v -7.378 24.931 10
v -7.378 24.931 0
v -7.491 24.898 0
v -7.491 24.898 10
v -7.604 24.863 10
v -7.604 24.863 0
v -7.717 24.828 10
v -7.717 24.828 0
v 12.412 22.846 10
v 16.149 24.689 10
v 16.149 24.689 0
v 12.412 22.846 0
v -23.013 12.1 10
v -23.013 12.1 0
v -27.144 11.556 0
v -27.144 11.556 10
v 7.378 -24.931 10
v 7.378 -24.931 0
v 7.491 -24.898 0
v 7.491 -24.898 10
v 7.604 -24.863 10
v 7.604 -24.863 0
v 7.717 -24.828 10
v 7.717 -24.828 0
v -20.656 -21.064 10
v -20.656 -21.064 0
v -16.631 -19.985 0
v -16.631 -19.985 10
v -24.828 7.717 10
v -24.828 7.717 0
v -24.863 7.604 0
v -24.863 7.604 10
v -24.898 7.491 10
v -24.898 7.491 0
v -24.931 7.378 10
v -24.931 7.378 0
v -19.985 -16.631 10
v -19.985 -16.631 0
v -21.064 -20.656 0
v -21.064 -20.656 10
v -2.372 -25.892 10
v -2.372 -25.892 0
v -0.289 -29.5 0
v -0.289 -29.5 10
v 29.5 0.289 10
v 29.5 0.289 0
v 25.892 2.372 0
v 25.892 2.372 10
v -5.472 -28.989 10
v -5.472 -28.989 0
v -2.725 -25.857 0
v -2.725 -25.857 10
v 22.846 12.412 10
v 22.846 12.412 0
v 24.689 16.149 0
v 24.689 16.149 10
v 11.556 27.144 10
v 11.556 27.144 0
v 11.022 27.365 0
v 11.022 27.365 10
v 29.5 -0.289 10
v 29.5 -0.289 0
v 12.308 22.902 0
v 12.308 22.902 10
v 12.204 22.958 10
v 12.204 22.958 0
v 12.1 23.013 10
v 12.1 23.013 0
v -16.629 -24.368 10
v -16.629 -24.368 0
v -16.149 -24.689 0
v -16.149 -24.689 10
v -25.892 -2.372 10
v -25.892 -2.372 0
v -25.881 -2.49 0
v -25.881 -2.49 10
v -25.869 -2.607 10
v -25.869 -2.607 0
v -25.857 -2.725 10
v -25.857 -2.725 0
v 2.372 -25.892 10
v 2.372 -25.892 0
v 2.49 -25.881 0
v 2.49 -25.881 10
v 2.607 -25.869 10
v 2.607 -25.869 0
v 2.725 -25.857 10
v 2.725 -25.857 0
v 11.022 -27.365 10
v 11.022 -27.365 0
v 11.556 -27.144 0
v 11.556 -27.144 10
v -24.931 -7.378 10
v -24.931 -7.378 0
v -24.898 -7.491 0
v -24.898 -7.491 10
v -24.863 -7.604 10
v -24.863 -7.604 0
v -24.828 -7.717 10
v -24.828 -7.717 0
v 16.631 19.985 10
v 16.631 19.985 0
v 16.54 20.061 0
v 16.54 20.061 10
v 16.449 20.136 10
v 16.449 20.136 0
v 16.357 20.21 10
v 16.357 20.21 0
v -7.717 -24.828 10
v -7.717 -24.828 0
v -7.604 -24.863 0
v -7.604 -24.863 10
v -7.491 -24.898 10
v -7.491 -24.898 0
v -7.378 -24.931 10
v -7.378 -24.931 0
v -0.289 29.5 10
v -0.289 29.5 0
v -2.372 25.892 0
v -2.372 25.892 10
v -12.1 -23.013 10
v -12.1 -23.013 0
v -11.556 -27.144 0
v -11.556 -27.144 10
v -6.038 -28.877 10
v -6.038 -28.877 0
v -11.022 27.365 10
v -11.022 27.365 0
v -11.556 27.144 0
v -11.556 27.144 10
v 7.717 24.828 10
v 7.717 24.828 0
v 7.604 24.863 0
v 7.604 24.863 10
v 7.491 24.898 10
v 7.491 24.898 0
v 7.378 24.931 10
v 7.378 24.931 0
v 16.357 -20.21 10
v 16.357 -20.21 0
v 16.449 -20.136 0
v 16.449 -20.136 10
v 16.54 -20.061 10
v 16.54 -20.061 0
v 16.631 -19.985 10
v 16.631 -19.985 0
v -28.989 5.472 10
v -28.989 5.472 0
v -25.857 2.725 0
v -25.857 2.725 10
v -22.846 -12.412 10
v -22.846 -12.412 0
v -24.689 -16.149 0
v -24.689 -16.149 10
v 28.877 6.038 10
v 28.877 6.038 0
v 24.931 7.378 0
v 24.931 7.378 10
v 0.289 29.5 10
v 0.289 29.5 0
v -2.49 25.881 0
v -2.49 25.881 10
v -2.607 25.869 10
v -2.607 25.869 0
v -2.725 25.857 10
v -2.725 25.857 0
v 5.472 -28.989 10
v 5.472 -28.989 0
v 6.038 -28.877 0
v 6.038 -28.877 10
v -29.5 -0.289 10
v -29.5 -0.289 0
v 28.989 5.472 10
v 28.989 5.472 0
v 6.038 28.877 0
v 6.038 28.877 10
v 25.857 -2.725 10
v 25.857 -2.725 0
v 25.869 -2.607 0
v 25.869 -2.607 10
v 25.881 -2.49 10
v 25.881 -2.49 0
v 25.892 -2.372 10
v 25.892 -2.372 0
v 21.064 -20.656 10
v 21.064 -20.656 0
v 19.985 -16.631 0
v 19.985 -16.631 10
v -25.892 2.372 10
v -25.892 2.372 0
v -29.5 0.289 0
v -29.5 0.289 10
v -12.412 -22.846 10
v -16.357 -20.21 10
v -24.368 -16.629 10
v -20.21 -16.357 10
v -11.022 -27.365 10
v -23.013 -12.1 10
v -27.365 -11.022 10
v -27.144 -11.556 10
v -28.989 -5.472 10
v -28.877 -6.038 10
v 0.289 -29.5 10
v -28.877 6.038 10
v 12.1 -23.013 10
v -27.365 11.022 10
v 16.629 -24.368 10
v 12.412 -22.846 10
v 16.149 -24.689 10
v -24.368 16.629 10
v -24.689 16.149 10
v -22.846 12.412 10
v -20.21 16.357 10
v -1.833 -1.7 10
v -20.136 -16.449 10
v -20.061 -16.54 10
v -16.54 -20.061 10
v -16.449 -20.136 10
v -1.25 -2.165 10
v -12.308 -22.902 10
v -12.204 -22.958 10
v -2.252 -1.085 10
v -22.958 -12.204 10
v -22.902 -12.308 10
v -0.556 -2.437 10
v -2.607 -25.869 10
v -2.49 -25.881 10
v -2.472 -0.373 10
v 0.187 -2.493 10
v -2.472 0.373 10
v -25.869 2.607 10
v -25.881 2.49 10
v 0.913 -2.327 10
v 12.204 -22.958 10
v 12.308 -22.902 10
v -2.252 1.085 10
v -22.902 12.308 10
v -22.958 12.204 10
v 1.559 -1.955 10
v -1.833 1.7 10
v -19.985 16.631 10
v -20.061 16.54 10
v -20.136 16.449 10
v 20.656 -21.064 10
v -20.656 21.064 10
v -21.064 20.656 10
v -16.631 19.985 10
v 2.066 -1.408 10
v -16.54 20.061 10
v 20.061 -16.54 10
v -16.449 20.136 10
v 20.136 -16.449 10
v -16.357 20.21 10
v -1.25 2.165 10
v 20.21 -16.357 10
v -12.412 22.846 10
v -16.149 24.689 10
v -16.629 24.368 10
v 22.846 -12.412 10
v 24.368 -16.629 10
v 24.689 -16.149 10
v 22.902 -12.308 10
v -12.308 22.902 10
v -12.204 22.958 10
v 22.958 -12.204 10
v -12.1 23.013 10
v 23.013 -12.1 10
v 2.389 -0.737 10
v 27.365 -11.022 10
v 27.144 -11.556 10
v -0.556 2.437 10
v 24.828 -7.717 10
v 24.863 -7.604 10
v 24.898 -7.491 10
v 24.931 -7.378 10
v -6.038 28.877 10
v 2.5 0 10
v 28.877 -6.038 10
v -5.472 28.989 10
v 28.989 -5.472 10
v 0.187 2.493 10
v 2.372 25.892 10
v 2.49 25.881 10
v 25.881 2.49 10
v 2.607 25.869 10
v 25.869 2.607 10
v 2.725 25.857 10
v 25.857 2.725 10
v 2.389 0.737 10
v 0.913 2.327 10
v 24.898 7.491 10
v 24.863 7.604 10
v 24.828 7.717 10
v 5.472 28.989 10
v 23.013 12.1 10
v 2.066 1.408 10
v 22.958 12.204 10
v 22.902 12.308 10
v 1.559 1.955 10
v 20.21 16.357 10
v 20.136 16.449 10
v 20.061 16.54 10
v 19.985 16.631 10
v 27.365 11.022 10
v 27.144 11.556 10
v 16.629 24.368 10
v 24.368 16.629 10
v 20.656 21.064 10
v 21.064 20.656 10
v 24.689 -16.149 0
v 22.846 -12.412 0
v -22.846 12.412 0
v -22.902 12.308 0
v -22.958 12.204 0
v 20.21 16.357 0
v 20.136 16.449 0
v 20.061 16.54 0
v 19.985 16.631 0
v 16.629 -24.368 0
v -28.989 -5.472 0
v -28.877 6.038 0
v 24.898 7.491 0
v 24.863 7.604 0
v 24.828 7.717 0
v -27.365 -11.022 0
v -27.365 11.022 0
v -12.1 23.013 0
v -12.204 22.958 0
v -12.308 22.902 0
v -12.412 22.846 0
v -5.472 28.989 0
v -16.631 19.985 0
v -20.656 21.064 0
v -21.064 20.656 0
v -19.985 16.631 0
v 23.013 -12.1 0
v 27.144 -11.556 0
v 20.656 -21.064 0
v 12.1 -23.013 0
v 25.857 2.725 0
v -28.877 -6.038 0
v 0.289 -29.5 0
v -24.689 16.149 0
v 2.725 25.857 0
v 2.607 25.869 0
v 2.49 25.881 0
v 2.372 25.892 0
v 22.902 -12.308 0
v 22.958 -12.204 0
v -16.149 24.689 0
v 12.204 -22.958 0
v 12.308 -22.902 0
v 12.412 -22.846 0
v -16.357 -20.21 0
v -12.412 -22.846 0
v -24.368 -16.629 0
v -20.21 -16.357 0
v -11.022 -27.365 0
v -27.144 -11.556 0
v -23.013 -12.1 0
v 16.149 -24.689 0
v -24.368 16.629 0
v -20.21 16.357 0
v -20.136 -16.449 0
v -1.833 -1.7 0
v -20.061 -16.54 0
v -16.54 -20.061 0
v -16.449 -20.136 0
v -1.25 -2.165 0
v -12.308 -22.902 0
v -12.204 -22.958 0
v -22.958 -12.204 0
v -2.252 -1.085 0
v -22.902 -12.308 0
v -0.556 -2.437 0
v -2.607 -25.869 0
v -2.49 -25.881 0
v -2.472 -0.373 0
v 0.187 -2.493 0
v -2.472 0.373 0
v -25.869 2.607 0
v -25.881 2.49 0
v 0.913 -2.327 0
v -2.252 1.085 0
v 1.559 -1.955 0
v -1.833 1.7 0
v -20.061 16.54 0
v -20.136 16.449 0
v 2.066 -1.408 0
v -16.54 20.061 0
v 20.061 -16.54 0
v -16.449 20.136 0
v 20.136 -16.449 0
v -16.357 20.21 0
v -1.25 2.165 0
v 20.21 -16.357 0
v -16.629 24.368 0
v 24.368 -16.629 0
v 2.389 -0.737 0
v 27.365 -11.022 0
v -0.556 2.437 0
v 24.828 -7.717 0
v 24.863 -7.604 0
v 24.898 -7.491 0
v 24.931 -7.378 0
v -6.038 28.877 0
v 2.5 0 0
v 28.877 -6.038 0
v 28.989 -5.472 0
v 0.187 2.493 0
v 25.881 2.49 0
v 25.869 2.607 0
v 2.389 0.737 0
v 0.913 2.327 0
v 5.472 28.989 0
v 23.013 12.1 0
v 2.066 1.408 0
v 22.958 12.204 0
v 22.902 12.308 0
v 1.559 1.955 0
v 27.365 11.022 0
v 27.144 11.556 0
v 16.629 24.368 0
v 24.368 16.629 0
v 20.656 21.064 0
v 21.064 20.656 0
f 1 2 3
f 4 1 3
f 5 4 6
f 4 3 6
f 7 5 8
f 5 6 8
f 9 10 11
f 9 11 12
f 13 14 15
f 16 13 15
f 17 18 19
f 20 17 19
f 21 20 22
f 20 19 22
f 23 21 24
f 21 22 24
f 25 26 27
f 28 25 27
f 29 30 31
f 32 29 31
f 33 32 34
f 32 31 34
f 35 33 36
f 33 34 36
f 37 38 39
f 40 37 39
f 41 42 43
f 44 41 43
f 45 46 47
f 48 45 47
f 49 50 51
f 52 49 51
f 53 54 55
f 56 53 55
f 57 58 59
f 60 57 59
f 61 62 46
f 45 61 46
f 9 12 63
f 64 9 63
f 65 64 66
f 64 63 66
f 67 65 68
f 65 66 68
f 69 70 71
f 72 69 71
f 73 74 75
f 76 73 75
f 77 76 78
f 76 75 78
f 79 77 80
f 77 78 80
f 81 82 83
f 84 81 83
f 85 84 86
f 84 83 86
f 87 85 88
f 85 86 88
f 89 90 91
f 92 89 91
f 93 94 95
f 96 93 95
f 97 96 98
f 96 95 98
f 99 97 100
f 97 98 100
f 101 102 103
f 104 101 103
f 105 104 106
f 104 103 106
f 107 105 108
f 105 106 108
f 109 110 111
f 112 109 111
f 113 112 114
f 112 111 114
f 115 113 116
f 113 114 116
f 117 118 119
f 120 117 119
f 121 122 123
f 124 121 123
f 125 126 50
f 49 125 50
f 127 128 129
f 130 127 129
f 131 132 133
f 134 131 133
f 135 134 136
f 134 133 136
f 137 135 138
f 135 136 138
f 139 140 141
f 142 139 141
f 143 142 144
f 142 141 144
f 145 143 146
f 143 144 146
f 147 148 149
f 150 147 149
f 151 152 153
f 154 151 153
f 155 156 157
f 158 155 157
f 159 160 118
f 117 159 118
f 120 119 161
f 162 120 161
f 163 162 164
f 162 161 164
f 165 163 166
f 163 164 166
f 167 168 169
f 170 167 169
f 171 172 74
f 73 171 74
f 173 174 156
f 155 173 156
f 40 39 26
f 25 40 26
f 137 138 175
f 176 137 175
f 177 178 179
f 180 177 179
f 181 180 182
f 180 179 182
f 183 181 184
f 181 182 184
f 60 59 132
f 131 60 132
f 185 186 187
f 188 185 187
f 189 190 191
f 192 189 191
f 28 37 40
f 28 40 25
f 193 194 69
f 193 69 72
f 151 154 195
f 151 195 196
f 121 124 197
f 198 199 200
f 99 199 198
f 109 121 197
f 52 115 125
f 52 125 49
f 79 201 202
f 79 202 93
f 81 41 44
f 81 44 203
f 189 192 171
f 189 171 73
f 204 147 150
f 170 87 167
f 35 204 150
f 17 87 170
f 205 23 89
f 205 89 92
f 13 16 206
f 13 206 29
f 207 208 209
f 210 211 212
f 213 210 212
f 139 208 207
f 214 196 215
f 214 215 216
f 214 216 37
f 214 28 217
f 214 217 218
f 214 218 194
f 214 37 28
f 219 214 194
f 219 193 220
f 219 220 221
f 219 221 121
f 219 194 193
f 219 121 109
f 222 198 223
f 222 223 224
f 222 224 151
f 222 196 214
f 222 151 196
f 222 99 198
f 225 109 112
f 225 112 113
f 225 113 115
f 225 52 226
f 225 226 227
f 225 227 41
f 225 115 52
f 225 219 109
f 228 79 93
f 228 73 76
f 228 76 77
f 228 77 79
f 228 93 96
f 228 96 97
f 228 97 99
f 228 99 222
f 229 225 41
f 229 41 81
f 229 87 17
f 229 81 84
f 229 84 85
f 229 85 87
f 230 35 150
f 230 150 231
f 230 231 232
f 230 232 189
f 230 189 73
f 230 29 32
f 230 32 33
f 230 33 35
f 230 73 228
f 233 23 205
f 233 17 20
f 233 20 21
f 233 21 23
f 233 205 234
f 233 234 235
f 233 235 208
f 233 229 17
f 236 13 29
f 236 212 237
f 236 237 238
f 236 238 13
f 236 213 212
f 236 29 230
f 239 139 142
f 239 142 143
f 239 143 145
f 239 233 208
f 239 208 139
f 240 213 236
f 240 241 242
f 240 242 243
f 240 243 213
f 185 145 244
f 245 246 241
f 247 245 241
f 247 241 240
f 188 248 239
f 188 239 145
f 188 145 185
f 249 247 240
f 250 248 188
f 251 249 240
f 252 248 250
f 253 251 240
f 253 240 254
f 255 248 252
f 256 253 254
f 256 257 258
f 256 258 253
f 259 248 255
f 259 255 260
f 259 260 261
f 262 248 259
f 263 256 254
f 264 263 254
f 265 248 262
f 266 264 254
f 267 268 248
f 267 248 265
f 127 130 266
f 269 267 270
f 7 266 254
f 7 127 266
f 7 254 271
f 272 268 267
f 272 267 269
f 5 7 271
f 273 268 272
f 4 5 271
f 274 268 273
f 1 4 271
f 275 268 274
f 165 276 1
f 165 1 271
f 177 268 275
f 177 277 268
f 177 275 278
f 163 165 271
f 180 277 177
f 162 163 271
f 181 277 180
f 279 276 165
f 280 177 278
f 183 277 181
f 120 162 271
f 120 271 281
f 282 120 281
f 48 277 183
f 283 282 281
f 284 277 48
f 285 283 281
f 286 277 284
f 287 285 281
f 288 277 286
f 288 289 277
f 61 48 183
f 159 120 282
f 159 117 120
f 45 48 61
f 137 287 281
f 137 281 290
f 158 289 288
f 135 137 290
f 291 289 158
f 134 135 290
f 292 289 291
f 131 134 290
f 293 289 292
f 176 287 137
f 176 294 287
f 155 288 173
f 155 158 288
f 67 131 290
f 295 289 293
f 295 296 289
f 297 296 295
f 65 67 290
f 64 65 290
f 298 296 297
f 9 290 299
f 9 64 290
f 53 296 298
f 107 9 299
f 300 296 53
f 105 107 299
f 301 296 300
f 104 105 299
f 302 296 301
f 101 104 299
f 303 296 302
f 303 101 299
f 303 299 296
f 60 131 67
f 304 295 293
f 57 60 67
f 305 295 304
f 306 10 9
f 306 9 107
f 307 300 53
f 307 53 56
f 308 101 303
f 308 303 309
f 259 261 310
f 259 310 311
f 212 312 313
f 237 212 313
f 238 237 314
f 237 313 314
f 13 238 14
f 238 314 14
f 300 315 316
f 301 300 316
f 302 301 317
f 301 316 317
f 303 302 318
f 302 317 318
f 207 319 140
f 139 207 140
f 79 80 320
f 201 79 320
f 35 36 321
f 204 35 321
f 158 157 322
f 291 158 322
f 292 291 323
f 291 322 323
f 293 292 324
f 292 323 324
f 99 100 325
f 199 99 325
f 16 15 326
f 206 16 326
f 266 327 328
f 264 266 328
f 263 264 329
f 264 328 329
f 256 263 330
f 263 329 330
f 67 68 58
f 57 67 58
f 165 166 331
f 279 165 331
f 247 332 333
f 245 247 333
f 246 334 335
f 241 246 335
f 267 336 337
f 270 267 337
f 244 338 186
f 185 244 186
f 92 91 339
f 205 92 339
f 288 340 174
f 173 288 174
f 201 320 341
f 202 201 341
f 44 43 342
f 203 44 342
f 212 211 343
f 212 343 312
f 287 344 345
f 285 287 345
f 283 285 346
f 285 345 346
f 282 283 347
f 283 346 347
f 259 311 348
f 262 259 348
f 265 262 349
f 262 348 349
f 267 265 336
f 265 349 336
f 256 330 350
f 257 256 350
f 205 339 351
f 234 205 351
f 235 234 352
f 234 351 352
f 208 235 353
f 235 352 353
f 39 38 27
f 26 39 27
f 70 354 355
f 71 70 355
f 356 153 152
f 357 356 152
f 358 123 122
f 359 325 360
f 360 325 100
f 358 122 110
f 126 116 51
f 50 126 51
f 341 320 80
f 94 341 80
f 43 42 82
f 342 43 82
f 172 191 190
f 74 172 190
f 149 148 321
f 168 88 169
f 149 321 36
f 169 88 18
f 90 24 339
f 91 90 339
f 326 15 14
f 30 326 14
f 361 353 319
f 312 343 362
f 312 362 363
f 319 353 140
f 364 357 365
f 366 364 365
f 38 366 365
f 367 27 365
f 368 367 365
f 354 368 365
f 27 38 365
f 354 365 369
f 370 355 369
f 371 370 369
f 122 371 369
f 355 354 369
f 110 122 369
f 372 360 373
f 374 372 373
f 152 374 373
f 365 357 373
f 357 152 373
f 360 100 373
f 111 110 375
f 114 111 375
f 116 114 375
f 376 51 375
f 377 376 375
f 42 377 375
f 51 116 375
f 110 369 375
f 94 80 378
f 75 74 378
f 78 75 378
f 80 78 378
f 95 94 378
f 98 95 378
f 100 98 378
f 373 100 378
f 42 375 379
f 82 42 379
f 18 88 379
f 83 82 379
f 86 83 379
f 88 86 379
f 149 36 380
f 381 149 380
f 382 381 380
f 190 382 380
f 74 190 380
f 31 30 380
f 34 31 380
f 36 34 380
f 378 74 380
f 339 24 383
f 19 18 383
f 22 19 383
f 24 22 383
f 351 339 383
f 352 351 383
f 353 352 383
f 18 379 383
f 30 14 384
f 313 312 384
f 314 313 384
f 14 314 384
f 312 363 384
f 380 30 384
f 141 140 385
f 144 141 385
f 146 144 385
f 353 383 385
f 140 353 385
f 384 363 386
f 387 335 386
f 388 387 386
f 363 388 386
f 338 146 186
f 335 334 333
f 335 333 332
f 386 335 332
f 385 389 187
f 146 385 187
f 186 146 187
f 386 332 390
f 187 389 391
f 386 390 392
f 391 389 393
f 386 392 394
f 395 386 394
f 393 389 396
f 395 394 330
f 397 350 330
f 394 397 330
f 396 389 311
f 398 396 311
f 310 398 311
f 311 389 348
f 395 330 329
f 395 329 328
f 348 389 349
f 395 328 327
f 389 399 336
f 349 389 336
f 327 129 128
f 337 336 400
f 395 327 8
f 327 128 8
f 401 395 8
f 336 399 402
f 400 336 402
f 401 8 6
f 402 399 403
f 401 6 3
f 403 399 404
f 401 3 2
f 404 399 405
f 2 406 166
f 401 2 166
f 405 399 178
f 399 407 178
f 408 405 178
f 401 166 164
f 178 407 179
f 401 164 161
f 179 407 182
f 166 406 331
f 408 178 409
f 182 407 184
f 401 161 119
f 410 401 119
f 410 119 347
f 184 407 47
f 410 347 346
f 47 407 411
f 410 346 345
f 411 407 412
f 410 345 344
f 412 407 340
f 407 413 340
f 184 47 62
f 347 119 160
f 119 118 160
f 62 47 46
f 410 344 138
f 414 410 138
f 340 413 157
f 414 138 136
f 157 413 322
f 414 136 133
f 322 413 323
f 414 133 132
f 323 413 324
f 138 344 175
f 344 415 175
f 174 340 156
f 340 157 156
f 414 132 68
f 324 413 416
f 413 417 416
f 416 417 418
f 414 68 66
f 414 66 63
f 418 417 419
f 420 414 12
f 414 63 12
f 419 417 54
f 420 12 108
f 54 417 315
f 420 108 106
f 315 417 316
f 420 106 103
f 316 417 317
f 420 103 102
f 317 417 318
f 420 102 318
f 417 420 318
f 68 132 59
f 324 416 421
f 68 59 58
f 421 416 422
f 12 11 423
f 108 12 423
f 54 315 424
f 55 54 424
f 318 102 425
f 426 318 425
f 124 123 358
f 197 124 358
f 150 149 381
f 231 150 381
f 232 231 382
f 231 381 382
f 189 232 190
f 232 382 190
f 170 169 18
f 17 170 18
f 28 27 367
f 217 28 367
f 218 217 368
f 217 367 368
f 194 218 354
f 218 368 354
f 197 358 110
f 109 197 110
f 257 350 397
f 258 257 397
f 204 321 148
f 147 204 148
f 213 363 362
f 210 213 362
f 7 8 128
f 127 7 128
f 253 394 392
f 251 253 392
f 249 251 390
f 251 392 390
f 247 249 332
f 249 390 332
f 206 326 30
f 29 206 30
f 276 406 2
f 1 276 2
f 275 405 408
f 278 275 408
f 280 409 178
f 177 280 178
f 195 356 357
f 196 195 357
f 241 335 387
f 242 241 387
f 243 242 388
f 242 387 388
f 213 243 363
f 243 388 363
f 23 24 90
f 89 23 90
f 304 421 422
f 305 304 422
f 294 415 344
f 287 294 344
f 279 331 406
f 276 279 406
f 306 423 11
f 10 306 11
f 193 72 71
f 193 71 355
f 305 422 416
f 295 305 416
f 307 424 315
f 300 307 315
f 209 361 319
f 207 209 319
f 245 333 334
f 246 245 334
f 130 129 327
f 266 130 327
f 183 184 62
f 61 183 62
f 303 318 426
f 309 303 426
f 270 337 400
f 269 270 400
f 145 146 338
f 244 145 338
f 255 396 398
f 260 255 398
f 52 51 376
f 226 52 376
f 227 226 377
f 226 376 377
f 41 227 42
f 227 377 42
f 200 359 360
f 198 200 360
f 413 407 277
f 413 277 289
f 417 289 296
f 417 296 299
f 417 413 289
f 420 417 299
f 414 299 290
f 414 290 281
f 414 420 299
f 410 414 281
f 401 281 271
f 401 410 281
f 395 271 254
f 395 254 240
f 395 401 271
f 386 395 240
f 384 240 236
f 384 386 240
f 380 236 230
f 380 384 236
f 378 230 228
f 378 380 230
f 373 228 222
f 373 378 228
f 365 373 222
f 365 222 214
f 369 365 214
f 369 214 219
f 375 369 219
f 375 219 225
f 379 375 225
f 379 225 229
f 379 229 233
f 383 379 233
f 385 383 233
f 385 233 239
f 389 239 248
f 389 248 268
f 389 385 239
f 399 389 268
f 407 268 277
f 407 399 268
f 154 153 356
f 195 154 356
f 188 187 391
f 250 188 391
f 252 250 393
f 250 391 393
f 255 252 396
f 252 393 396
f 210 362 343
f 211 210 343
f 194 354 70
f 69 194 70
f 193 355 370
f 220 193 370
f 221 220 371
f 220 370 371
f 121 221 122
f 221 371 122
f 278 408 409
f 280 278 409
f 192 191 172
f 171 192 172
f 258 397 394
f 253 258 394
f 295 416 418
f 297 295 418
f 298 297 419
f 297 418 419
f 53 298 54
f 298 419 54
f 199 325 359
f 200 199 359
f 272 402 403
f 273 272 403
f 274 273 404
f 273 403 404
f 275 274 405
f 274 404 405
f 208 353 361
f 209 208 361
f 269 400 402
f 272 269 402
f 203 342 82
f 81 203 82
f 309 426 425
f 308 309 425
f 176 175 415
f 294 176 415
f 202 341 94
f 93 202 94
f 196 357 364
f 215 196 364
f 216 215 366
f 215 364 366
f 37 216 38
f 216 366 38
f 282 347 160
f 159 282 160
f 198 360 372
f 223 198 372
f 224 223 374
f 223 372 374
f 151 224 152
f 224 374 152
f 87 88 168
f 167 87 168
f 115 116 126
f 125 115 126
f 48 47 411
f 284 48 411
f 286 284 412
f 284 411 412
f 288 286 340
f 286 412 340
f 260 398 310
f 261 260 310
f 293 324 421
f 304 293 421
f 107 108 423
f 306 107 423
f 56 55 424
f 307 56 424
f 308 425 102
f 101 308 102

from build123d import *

# Parameters (mm, degrees)
SKETCH1_R           = 2.5
BOSS_EXTRUDE1_DEPTH = 10


with BuildPart() as part:
    # Sketch1 → Boss-Extrude1 (new body)
    with BuildSketch(Plane.XY):
        with BuildLine():
            Line((-28.989483497, 5.472036177), (-25.856829214, 2.724772104))
            ThreePointArc((-25.856829214, 2.724772104), (-25.874802893, 2.548445649), (-25.891574158, 2.372000766))
            Line((-25.891574158, 2.372000766), (-29.5, 0.288675135))
            Line((-29.5, 0.288675135), (-29.5, -0.288675135))
            Line((-29.5, -0.288675135), (-25.891574158, -2.372000766))
            ThreePointArc((-25.891574158, -2.372000766), (-25.874802893, -2.548445649), (-25.856829214, -2.724772104))
            Line((-25.856829214, -2.724772104), (-28.989483497, -5.472036177))
            Line((-28.989483497, -5.472036177), (-28.876848047, -6.038292822))
            Line((-28.876848047, -6.038292822), (-24.931320427, -7.377618976))
            ThreePointArc((-24.931320427, -7.377618976), (-24.880448729, -7.547401609), (-24.828420824, -7.716833509))
            Line((-24.828420824, -7.716833509), (-27.3649174, -11.022460206))
            Line((-27.3649174, -11.022460206), (-27.143975018, -11.555862303))
            Line((-27.143975018, -11.555862303), (-23.012970034, -12.099719427))
            ThreePointArc((-23.012970034, -12.099719427), (-22.929952873, -12.256315157), (-22.845870145, -12.412341331))
            Line((-22.845870145, -12.412341331), (-24.688732875, -16.149297272))
            Line((-24.688732875, -16.149297272), (-24.367974251, -16.629346476))
            Line((-24.367974251, -16.629346476), (-20.210244109, -16.356834445))
            ThreePointArc((-20.210244109, -16.356834445), (-20.098271787, -16.494225388), (-19.985365489, -16.630849836))
            Line((-19.985365489, -16.630849836), (-21.06377419, -20.6555259))
            Line((-21.06377419, -20.6555259), (-20.6555259, -21.06377419))
            Line((-20.6555259, -21.06377419), (-16.630849836, -19.985365489))
            ThreePointArc((-16.630849836, -19.985365489), (-16.494225388, -20.098271787), (-16.356834445, -20.210244109))
            Line((-16.356834445, -20.210244109), (-16.629346476, -24.367974251))
            Line((-16.629346476, -24.367974251), (-16.149297272, -24.688732875))
            Line((-16.149297272, -24.688732875), (-12.412341331, -22.845870145))
            ThreePointArc((-12.412341331, -22.845870145), (-12.256315157, -22.929952873), (-12.099719427, -23.012970034))
            Line((-12.099719427, -23.012970034), (-11.555862303, -27.143975018))
            Line((-11.555862303, -27.143975018), (-11.022460206, -27.3649174))
            Line((-11.022460206, -27.3649174), (-7.716833509, -24.828420824))
            ThreePointArc((-7.716833509, -24.828420824), (-7.547401609, -24.880448729), (-7.377618976, -24.931320427))
            Line((-7.377618976, -24.931320427), (-6.038292822, -28.876848047))
            Line((-6.038292822, -28.876848047), (-5.472036177, -28.989483497))
            Line((-5.472036177, -28.989483497), (-2.724772104, -25.856829214))
            ThreePointArc((-2.724772104, -25.856829214), (-2.548445649, -25.874802893), (-2.372000766, -25.891574158))
            Line((-2.372000766, -25.891574158), (-0.288675135, -29.5))
            Line((-0.288675135, -29.5), (0.288675135, -29.5))
            Line((0.288675135, -29.5), (2.372000766, -25.891574158))
            ThreePointArc((2.372000766, -25.891574158), (2.548445649, -25.874802893), (2.724772104, -25.856829214))
            Line((2.724772104, -25.856829214), (5.472036177, -28.989483497))
            Line((5.472036177, -28.989483497), (6.038292822, -28.876848047))
            Line((6.038292822, -28.876848047), (7.377618976, -24.931320427))
            ThreePointArc((7.377618976, -24.931320427), (7.547401609, -24.880448729), (7.716833509, -24.828420824))
            Line((7.716833509, -24.828420824), (11.022460206, -27.3649174))
            Line((11.022460206, -27.3649174), (11.555862303, -27.143975018))
            Line((11.555862303, -27.143975018), (12.099719427, -23.012970034))
            ThreePointArc((12.099719427, -23.012970034), (12.256315157, -22.929952873), (12.412341331, -22.845870145))
            Line((12.412341331, -22.845870145), (16.149297272, -24.688732875))
            Line((16.149297272, -24.688732875), (16.629346476, -24.367974251))
            Line((16.629346476, -24.367974251), (16.356834445, -20.210244109))
            ThreePointArc((16.356834445, -20.210244109), (16.494225388, -20.098271787), (16.630849836, -19.985365489))
            Line((16.630849836, -19.985365489), (20.6555259, -21.06377419))
            Line((20.6555259, -21.06377419), (21.06377419, -20.6555259))
            Line((21.06377419, -20.6555259), (19.985365489, -16.630849836))
            ThreePointArc((19.985365489, -16.630849836), (20.098271787, -16.494225388), (20.210244109, -16.356834445))
            Line((20.210244109, -16.356834445), (24.367974251, -16.629346476))
            Line((24.367974251, -16.629346476), (24.688732875, -16.149297272))
            Line((24.688732875, -16.149297272), (22.845870145, -12.412341331))
            ThreePointArc((22.845870145, -12.412341331), (22.929952873, -12.256315157), (23.012970034, -12.099719427))
            Line((23.012970034, -12.099719427), (27.143975018, -11.555862303))
            Line((27.143975018, -11.555862303), (27.3649174, -11.022460206))
            Line((27.3649174, -11.022460206), (24.828420824, -7.716833509))
            ThreePointArc((24.828420824, -7.716833509), (24.880448729, -7.547401609), (24.931320427, -7.377618976))
            Line((24.931320427, -7.377618976), (28.876848047, -6.038292822))
            Line((28.876848047, -6.038292822), (28.989483497, -5.472036177))
            Line((28.989483497, -5.472036177), (25.856829214, -2.724772104))
            ThreePointArc((25.856829214, -2.724772104), (25.874802893, -2.548445649), (25.891574158, -2.372000766))
            Line((25.891574158, -2.372000766), (29.5, -0.288675135))
            Line((29.5, -0.288675135), (29.5, 0.288675135))
            Line((29.5, 0.288675135), (25.891574158, 2.372000766))
            ThreePointArc((25.891574158, 2.372000766), (25.874802893, 2.548445649), (25.856829214, 2.724772104))
            Line((25.856829214, 2.724772104), (28.989483497, 5.472036177))
            Line((28.989483497, 5.472036177), (28.876848047, 6.038292822))
            Line((28.876848047, 6.038292822), (24.931320427, 7.377618976))
            ThreePointArc((24.931320427, 7.377618976), (24.880448729, 7.547401609), (24.828420824, 7.716833509))
            Line((24.828420824, 7.716833509), (27.3649174, 11.022460206))
            Line((27.3649174, 11.022460206), (27.143975018, 11.555862303))
            Line((27.143975018, 11.555862303), (23.012970034, 12.099719427))
            ThreePointArc((23.012970034, 12.099719427), (22.929952873, 12.256315157), (22.845870145, 12.412341331))
            Line((22.845870145, 12.412341331), (24.688732875, 16.149297272))
            Line((24.688732875, 16.149297272), (24.367974251, 16.629346476))
            Line((24.367974251, 16.629346476), (20.210244109, 16.356834445))
            ThreePointArc((20.210244109, 16.356834445), (20.098271787, 16.494225388), (19.985365489, 16.630849836))
            Line((19.985365489, 16.630849836), (21.06377419, 20.6555259))
            Line((21.06377419, 20.6555259), (20.6555259, 21.06377419))
            Line((20.6555259, 21.06377419), (16.630849836, 19.985365489))
            ThreePointArc((16.630849836, 19.985365489), (16.494225388, 20.098271787), (16.356834445, 20.210244109))
            Line((16.356834445, 20.210244109), (16.629346476, 24.367974251))
            Line((16.629346476, 24.367974251), (16.149297272, 24.688732875))
            Line((16.149297272, 24.688732875), (12.412341331, 22.845870145))
            ThreePointArc((12.412341331, 22.845870145), (12.256315157, 22.929952873), (12.099719427, 23.012970034))
            Line((12.099719427, 23.012970034), (11.555862303, 27.143975018))
            Line((11.555862303, 27.143975018), (11.022460206, 27.3649174))
            Line((11.022460206, 27.3649174), (7.716833509, 24.828420824))
            ThreePointArc((7.716833509, 24.828420824), (7.547401609, 24.880448729), (7.377618976, 24.931320427))
            Line((7.377618976, 24.931320427), (6.038292822, 28.876848047))
            Line((6.038292822, 28.876848047), (5.472036177, 28.989483497))
            Line((5.472036177, 28.989483497), (2.724772104, 25.856829214))
            ThreePointArc((2.724772104, 25.856829214), (2.548445649, 25.874802893), (2.372000766, 25.891574158))
            Line((2.372000766, 25.891574158), (0.288675135, 29.5))
            Line((0.288675135, 29.5), (-0.288675135, 29.5))
            Line((-0.288675135, 29.5), (-2.372000766, 25.891574158))
            ThreePointArc((-2.372000766, 25.891574158), (-2.548445649, 25.874802893), (-2.724772104, 25.856829214))
            Line((-2.724772104, 25.856829214), (-5.472036177, 28.989483497))
            Line((-5.472036177, 28.989483497), (-6.038292822, 28.876848047))
            Line((-6.038292822, 28.876848047), (-7.377618976, 24.931320427))
            ThreePointArc((-7.377618976, 24.931320427), (-7.547401609, 24.880448729), (-7.716833509, 24.828420824))
            Line((-7.716833509, 24.828420824), (-11.022460206, 27.3649174))
            Line((-11.022460206, 27.3649174), (-11.555862303, 27.143975018))
            Line((-11.555862303, 27.143975018), (-12.099719427, 23.012970034))
            ThreePointArc((-12.099719427, 23.012970034), (-12.256315157, 22.929952873), (-12.412341331, 22.845870145))
            Line((-12.412341331, 22.845870145), (-16.149297272, 24.688732875))
            Line((-16.149297272, 24.688732875), (-16.629346476, 24.367974251))
            Line((-16.629346476, 24.367974251), (-16.356834445, 20.210244109))
            ThreePointArc((-16.356834445, 20.210244109), (-16.494225388, 20.098271787), (-16.630849836, 19.985365489))
            Line((-16.630849836, 19.985365489), (-20.6555259, 21.06377419))
            Line((-20.6555259, 21.06377419), (-21.06377419, 20.6555259))
            Line((-21.06377419, 20.6555259), (-19.985365489, 16.630849836))
            ThreePointArc((-19.985365489, 16.630849836), (-20.098271787, 16.494225388), (-20.210244109, 16.356834445))
            Line((-20.210244109, 16.356834445), (-24.367974251, 16.629346476))
            Line((-24.367974251, 16.629346476), (-24.688732875, 16.149297272))
            Line((-24.688732875, 16.149297272), (-22.845870145, 12.412341331))
            ThreePointArc((-22.845870145, 12.412341331), (-22.929952873, 12.256315157), (-23.012970034, 12.099719427))
            Line((-23.012970034, 12.099719427), (-27.143975018, 11.555862303))
            Line((-27.143975018, 11.555862303), (-27.3649174, 11.022460206))
            Line((-27.3649174, 11.022460206), (-24.828420824, 7.716833509))
            ThreePointArc((-24.828420824, 7.716833509), (-24.880448729, 7.547401609), (-24.931320427, 7.377618976))
            Line((-24.931320427, 7.377618976), (-28.876848047, 6.038292822))
            Line((-28.876848047, 6.038292822), (-28.989483497, 5.472036177))
        make_face()
        Circle(SKETCH1_R, mode=Mode.SUBTRACT)
    extrude(amount=BOSS_EXTRUDE1_DEPTH)


solid = part.part
